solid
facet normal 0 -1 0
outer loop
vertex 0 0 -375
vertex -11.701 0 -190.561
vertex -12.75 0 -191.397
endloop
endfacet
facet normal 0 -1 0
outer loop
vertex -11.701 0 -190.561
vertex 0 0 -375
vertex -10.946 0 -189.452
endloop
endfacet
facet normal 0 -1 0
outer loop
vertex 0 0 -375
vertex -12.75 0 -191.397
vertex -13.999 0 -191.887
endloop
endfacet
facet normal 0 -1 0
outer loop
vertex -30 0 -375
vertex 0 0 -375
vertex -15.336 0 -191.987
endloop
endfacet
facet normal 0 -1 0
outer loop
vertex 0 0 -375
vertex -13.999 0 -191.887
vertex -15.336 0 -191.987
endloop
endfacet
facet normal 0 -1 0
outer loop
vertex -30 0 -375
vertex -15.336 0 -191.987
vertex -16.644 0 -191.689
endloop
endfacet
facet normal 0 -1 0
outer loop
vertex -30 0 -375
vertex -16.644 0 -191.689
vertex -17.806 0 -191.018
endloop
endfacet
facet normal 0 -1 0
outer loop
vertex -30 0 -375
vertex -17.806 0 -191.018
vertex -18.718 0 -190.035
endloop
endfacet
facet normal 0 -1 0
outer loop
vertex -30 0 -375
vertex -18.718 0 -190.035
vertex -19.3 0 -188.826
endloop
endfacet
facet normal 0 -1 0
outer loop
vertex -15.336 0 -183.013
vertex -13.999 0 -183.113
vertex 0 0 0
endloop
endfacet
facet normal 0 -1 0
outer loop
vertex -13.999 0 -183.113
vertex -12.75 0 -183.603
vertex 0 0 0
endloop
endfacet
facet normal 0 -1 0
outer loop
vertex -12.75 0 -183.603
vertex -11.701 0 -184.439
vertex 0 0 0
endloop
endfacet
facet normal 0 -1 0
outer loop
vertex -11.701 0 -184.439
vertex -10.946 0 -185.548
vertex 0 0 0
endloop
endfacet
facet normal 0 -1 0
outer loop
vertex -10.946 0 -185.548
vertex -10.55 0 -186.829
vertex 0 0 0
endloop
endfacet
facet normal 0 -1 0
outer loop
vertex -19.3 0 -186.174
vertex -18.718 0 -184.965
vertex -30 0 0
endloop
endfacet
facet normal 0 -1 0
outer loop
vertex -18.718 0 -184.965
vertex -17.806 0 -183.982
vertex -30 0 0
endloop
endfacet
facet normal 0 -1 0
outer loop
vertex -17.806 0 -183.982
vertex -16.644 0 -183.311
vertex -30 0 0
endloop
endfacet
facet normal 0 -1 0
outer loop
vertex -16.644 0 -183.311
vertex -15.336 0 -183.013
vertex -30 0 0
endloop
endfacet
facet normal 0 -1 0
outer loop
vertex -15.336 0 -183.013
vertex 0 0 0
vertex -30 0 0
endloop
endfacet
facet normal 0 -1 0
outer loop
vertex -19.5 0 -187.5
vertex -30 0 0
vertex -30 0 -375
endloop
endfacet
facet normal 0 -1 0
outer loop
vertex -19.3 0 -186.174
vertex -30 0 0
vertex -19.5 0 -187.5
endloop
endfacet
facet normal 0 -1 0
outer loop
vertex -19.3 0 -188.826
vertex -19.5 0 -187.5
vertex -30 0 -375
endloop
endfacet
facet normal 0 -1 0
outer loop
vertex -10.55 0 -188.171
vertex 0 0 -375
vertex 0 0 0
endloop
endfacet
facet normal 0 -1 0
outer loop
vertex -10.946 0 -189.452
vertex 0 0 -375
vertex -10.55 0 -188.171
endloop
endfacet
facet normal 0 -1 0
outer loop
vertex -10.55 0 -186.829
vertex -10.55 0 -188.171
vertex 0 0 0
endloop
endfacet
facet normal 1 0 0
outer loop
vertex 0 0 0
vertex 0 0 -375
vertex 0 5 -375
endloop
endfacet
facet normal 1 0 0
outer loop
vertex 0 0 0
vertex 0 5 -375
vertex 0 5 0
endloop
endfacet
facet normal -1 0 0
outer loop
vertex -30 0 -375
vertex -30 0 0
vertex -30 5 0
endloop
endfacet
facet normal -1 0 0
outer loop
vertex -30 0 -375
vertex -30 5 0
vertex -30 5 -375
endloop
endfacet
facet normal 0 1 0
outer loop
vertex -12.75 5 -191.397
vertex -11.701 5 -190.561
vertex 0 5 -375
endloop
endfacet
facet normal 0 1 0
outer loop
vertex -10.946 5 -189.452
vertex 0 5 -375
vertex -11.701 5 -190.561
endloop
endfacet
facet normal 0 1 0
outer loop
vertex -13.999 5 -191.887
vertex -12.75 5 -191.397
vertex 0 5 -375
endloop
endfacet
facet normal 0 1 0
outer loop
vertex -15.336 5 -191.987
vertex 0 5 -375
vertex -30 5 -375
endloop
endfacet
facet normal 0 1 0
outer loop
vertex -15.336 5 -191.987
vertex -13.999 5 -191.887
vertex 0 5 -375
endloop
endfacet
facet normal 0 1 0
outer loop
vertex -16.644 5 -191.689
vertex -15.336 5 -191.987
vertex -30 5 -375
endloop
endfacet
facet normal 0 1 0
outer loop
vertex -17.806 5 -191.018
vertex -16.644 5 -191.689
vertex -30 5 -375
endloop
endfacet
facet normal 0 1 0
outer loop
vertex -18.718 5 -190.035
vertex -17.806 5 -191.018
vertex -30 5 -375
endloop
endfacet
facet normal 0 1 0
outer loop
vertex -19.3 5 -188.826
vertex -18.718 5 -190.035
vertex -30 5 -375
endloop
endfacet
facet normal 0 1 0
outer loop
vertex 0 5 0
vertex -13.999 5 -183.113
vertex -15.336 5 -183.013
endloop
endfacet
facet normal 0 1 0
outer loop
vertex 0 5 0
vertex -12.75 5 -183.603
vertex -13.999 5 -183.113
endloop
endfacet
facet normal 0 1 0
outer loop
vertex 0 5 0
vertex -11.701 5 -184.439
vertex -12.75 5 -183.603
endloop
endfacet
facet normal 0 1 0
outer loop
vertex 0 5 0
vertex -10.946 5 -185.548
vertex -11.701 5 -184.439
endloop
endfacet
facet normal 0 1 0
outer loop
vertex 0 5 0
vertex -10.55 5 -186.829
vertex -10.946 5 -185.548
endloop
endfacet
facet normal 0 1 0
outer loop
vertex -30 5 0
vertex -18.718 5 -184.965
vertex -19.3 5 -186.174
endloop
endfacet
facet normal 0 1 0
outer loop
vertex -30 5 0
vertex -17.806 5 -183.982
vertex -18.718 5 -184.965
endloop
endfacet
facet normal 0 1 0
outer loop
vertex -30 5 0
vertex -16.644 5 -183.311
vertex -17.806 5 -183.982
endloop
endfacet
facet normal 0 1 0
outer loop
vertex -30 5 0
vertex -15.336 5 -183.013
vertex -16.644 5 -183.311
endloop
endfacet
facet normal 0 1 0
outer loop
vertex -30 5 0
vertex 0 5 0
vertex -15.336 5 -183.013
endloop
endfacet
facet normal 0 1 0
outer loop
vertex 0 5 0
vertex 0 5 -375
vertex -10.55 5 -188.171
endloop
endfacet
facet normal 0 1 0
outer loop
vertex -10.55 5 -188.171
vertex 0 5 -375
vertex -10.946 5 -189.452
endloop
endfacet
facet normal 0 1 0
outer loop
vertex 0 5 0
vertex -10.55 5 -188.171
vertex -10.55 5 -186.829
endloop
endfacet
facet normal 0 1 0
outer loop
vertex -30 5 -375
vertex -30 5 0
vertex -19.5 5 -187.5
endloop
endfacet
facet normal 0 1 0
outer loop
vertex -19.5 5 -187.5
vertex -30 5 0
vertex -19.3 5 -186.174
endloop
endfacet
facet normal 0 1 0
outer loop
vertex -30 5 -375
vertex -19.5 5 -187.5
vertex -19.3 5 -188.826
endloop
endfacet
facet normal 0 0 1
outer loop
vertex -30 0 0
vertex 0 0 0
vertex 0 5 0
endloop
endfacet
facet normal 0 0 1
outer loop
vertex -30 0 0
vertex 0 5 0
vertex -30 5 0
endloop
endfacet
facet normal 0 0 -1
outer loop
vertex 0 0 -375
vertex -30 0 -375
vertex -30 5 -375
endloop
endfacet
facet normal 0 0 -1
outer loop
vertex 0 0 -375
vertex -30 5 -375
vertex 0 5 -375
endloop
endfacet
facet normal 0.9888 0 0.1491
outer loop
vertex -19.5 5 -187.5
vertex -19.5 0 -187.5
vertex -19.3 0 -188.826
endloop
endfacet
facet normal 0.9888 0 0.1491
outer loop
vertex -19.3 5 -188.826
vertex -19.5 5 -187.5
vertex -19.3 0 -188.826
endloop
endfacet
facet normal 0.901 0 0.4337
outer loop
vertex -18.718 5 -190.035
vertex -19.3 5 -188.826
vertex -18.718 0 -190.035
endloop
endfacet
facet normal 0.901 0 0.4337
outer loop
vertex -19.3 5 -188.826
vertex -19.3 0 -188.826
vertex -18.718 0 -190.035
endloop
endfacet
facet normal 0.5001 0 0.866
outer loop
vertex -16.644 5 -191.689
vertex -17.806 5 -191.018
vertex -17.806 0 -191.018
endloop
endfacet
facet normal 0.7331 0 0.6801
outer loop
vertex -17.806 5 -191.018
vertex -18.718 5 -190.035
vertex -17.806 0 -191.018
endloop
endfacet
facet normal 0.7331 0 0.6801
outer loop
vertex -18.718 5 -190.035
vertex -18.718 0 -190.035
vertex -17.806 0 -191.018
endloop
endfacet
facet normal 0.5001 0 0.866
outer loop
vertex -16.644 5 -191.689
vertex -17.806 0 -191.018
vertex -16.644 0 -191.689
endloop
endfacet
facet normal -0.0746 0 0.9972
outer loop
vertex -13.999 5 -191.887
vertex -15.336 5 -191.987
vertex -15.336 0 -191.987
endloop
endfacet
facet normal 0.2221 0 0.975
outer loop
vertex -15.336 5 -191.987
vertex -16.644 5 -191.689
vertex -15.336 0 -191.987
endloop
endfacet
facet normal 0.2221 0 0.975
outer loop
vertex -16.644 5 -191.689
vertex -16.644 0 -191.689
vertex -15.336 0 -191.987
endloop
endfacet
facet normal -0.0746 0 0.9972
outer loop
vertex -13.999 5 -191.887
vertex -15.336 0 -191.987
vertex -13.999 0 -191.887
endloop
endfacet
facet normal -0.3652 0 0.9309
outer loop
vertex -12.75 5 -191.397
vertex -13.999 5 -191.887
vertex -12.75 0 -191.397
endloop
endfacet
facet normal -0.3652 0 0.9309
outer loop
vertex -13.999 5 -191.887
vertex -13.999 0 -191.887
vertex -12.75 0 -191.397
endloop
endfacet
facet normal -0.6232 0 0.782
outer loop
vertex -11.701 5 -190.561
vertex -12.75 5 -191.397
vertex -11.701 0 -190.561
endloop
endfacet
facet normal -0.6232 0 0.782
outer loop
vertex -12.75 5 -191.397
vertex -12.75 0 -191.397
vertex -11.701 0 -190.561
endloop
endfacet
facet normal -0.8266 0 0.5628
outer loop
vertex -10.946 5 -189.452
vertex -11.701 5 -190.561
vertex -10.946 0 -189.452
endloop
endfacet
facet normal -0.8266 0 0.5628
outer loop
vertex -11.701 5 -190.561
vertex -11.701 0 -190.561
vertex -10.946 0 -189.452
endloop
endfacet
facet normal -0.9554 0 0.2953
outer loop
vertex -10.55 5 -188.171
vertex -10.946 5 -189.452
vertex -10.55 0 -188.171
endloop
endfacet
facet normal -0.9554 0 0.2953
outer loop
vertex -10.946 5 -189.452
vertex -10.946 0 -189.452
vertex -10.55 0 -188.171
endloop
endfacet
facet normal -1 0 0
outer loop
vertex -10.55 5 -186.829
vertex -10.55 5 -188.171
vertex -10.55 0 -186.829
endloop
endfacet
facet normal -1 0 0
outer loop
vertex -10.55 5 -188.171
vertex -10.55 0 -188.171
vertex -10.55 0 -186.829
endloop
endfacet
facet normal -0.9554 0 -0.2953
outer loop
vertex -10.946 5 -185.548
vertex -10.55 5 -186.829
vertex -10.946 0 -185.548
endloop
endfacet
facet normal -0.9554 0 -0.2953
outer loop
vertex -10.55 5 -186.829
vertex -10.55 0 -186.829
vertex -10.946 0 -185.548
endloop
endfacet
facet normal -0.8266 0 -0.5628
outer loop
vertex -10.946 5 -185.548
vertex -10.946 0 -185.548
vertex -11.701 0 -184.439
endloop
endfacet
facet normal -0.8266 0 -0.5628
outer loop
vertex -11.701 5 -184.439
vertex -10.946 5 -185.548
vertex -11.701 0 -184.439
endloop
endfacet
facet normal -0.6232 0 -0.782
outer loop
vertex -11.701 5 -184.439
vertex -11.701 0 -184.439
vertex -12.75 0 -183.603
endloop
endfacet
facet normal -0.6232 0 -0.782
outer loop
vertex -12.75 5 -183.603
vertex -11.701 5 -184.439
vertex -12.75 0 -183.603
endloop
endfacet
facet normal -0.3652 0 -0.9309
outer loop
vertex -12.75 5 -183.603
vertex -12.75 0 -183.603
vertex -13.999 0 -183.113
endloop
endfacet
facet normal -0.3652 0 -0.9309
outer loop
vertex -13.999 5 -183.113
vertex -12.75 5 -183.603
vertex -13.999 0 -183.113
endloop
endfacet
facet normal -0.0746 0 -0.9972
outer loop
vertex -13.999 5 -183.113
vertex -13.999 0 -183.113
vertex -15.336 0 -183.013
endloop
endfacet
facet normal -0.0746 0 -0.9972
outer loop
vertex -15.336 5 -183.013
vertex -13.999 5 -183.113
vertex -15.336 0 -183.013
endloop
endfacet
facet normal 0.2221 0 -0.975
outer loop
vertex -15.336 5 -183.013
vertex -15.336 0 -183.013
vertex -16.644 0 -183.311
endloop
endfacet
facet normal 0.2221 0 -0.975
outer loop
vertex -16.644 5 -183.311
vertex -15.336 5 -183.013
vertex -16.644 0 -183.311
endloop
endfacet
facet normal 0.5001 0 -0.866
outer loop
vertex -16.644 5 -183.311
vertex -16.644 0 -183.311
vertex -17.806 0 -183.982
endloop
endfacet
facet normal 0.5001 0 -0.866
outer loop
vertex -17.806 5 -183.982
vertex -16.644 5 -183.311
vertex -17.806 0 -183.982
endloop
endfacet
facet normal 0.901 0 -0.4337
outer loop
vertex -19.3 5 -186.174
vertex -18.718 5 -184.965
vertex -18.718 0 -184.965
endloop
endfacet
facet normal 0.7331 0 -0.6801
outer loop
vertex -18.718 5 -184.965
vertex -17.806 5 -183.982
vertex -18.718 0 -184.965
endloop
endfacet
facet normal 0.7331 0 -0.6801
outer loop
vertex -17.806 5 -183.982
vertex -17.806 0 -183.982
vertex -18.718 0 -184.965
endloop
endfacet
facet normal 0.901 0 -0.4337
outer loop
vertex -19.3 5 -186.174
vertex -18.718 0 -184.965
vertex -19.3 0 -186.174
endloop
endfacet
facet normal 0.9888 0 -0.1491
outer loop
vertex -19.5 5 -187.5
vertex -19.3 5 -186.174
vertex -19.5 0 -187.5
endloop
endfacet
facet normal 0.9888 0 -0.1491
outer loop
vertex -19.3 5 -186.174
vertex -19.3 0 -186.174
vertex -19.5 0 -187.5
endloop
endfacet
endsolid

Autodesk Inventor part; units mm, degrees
ref_plane "YZ Plane" through (0, 0, 0) normal (1, 0, 0) x (0, 1, 0)
ref_plane "XZ Plane" through (0, 0, 0) normal (0, 1, 0) x (-1, 0, 0)
ref_plane "XY Plane" through (0, 0, 0) normal (0, 0, 1) x (1, 0, 0)
sketch "Boceto1" plane through (0, 0, 0) normal (0, 1, 0) x (-1, 0, 0)
  line L0 (0, 0) -> (30, 0)
  line L1 (30, 0) -> (30, -375)
  line L2 (30, -375) -> (0, -375)
  line L3 (0, -375) -> (0, 0)
  circle A0 centre (15, -187.5) radius 4.5
  dimension "d0" = 375
  dimension "d1" = 30
  dimension "d4" = 9
  dimension "d5" = 15
  dimension "d6" = 187.5
extrude "Extrusión2" add sketch "Boceto1" along normal blind 5
properties part number "Base.pin.Seg" material "Acrílico, claro"
